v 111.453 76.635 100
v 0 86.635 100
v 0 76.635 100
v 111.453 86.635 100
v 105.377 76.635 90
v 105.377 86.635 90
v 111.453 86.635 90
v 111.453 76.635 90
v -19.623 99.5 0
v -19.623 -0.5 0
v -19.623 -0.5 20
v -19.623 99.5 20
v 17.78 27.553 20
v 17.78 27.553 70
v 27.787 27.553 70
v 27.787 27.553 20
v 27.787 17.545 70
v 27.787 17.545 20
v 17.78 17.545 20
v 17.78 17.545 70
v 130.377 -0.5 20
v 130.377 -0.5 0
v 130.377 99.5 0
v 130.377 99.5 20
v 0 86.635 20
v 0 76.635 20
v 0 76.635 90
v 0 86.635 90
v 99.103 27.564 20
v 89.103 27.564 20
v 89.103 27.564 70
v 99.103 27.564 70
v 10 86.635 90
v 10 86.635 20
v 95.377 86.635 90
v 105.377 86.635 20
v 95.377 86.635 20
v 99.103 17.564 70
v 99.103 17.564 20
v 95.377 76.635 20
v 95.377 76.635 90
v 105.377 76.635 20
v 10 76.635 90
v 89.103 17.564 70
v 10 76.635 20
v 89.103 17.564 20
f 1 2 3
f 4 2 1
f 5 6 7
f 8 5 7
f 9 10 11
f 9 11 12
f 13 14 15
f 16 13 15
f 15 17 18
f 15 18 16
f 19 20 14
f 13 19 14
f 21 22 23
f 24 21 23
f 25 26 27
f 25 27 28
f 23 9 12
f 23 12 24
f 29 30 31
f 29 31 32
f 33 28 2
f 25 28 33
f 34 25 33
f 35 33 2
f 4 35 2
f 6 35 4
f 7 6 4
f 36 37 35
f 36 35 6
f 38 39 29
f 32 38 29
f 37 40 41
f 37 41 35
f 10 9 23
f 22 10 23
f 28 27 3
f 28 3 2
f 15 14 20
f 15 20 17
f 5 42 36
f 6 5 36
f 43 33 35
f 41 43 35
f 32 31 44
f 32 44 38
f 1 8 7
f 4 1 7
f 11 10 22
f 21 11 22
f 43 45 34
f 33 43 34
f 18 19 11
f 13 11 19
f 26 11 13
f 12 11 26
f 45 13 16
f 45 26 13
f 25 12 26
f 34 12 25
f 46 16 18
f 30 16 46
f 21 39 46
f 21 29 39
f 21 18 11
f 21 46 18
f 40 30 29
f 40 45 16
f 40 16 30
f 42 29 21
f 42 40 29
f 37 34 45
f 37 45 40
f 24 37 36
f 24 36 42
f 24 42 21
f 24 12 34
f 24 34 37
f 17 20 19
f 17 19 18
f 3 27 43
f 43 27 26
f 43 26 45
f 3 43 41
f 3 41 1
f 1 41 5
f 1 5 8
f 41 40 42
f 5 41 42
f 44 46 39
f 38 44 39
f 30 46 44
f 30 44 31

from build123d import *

# Parameters (mm, degrees)
F0_W     = 150
F0_H     = 100
F1_DEPTH = 20
F2_W     = 10
F2_H     = 10
F3_DEPTH = 70
F2_W_2   = 10.0076
F2_H_2   = 10.0076
F4_DEPTH = 50
F5_W     = 111.453053
F5_H     = 10
F6_DEPTH = 10


with BuildPart() as f1:
    # F0 (on Top) → F1 (new body)
    with BuildSketch(Plane.XY):
        with Locations((55.377272, 49.499587)):
            Rectangle(F0_W, F0_H)
    extrude(amount=F1_DEPTH)

    # F2 (on face) → F3 (join)
    with BuildSketch(Plane.XY.offset(20)):
        with Locations((5, 81.634671)):
            Rectangle(F2_W, F2_H)
        with Locations((100.377272, 81.634671)):
            Rectangle(F2_W, F2_H)
    extrude(amount=F3_DEPTH)

    # F2 (on face) → F4 (join)
    with BuildSketch(Plane.XY.offset(20)):
        with Locations((22.783541, 22.548811)):
            Rectangle(F2_W_2, F2_H_2)
        with Locations((94.102842, 22.564183)):
            Rectangle(F2_W, F2_H)
    extrude(amount=F4_DEPTH)

    # F5 (on face) → F6 (join)
    with BuildSketch(Plane.XY.offset(90)):
        with Locations((55.726526, 81.634671)):
            Rectangle(F5_W, F5_H)
    extrude(amount=F6_DEPTH)


solid = f1.part
